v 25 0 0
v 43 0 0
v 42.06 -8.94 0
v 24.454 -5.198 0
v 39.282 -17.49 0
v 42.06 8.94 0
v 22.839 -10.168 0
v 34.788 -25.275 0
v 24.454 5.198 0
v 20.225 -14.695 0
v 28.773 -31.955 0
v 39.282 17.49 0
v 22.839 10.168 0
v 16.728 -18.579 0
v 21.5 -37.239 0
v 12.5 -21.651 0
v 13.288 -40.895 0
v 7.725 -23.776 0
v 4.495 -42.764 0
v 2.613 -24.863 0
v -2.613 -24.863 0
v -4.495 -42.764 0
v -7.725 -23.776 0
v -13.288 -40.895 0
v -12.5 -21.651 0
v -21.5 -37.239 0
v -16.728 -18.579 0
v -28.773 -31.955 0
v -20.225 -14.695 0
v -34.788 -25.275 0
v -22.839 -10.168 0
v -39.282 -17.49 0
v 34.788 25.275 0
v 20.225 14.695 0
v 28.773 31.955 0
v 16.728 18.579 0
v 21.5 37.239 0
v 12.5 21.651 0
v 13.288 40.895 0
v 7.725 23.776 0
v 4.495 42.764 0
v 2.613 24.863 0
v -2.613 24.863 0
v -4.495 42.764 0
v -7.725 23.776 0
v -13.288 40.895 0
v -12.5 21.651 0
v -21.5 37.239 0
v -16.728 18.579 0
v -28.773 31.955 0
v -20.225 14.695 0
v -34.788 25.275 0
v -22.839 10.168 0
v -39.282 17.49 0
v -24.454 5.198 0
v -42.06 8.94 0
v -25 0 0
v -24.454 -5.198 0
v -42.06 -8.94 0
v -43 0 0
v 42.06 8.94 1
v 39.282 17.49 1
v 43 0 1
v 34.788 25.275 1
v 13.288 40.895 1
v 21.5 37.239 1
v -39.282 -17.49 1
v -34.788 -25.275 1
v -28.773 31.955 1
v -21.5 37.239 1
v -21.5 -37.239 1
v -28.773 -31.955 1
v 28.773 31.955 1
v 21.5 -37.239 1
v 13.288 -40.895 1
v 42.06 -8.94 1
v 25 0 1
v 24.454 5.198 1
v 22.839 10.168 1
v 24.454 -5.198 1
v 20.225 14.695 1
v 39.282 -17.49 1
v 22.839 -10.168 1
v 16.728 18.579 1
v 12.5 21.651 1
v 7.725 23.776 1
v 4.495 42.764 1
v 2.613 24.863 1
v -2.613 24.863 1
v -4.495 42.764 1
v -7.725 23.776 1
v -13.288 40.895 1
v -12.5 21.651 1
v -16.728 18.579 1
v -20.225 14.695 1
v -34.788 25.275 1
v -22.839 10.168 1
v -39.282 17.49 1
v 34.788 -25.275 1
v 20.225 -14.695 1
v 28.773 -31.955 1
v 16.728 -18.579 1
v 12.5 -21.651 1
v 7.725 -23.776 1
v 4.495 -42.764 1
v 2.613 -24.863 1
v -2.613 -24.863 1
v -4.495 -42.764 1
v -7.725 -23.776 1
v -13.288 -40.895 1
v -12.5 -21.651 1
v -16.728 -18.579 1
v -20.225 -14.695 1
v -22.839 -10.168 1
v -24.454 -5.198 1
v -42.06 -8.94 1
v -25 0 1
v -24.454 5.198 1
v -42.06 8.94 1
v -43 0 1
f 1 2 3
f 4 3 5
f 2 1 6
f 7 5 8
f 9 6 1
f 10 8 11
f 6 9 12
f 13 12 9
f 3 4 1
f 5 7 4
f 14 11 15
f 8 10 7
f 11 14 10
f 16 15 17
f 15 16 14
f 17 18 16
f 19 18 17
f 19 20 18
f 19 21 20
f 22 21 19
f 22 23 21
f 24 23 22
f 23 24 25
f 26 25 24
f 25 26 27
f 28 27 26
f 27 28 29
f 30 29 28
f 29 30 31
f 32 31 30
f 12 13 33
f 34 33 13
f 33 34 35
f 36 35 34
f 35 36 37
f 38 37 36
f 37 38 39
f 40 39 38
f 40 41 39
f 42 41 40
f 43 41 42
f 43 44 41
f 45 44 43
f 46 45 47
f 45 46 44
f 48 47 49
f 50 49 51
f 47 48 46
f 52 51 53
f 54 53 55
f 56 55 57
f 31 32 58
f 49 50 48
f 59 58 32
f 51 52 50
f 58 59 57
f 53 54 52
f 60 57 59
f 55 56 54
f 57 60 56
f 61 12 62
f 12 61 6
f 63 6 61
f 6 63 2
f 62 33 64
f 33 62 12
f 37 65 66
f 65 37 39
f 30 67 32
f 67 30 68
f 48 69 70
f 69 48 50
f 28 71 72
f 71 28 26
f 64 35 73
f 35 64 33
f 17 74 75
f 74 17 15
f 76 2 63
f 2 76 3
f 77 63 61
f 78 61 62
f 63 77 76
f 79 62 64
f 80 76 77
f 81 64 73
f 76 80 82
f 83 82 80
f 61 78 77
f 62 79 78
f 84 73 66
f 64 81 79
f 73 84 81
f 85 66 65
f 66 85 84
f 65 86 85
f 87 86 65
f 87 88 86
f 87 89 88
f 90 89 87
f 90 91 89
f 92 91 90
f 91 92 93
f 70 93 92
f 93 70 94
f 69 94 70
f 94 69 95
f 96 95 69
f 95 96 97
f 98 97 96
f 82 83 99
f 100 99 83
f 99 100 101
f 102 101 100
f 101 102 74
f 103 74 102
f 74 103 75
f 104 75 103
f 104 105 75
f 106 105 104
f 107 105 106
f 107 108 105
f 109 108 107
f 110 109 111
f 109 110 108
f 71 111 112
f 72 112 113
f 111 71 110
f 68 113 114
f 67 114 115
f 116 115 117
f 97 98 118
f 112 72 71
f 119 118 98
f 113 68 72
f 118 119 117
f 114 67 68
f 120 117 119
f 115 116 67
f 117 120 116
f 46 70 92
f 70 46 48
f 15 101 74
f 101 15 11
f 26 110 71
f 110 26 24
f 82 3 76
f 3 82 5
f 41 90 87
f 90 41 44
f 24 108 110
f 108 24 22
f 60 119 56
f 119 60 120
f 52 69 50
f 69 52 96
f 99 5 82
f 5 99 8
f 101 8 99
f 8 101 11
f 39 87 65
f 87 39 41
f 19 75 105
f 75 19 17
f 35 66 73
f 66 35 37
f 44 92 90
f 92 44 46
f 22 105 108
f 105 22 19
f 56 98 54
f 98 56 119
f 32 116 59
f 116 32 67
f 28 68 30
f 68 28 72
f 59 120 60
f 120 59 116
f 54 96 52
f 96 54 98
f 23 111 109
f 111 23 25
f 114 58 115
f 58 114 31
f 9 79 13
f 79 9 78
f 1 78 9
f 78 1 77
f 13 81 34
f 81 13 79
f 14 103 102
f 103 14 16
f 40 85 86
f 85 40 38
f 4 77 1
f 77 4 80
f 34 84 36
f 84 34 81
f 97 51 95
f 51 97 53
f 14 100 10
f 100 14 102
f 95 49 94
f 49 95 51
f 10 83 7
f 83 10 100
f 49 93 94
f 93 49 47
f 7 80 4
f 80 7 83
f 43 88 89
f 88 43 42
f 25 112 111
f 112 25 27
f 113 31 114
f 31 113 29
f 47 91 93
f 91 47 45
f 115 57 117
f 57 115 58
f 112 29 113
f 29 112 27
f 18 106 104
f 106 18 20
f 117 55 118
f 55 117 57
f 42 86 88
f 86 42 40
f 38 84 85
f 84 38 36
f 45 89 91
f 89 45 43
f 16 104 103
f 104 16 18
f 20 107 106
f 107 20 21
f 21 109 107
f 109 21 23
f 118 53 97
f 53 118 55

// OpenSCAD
difference() {
  cylinder(r=43, h=1);
  translate([0,0,-0.5]) cylinder(r=25, h=2);

}
